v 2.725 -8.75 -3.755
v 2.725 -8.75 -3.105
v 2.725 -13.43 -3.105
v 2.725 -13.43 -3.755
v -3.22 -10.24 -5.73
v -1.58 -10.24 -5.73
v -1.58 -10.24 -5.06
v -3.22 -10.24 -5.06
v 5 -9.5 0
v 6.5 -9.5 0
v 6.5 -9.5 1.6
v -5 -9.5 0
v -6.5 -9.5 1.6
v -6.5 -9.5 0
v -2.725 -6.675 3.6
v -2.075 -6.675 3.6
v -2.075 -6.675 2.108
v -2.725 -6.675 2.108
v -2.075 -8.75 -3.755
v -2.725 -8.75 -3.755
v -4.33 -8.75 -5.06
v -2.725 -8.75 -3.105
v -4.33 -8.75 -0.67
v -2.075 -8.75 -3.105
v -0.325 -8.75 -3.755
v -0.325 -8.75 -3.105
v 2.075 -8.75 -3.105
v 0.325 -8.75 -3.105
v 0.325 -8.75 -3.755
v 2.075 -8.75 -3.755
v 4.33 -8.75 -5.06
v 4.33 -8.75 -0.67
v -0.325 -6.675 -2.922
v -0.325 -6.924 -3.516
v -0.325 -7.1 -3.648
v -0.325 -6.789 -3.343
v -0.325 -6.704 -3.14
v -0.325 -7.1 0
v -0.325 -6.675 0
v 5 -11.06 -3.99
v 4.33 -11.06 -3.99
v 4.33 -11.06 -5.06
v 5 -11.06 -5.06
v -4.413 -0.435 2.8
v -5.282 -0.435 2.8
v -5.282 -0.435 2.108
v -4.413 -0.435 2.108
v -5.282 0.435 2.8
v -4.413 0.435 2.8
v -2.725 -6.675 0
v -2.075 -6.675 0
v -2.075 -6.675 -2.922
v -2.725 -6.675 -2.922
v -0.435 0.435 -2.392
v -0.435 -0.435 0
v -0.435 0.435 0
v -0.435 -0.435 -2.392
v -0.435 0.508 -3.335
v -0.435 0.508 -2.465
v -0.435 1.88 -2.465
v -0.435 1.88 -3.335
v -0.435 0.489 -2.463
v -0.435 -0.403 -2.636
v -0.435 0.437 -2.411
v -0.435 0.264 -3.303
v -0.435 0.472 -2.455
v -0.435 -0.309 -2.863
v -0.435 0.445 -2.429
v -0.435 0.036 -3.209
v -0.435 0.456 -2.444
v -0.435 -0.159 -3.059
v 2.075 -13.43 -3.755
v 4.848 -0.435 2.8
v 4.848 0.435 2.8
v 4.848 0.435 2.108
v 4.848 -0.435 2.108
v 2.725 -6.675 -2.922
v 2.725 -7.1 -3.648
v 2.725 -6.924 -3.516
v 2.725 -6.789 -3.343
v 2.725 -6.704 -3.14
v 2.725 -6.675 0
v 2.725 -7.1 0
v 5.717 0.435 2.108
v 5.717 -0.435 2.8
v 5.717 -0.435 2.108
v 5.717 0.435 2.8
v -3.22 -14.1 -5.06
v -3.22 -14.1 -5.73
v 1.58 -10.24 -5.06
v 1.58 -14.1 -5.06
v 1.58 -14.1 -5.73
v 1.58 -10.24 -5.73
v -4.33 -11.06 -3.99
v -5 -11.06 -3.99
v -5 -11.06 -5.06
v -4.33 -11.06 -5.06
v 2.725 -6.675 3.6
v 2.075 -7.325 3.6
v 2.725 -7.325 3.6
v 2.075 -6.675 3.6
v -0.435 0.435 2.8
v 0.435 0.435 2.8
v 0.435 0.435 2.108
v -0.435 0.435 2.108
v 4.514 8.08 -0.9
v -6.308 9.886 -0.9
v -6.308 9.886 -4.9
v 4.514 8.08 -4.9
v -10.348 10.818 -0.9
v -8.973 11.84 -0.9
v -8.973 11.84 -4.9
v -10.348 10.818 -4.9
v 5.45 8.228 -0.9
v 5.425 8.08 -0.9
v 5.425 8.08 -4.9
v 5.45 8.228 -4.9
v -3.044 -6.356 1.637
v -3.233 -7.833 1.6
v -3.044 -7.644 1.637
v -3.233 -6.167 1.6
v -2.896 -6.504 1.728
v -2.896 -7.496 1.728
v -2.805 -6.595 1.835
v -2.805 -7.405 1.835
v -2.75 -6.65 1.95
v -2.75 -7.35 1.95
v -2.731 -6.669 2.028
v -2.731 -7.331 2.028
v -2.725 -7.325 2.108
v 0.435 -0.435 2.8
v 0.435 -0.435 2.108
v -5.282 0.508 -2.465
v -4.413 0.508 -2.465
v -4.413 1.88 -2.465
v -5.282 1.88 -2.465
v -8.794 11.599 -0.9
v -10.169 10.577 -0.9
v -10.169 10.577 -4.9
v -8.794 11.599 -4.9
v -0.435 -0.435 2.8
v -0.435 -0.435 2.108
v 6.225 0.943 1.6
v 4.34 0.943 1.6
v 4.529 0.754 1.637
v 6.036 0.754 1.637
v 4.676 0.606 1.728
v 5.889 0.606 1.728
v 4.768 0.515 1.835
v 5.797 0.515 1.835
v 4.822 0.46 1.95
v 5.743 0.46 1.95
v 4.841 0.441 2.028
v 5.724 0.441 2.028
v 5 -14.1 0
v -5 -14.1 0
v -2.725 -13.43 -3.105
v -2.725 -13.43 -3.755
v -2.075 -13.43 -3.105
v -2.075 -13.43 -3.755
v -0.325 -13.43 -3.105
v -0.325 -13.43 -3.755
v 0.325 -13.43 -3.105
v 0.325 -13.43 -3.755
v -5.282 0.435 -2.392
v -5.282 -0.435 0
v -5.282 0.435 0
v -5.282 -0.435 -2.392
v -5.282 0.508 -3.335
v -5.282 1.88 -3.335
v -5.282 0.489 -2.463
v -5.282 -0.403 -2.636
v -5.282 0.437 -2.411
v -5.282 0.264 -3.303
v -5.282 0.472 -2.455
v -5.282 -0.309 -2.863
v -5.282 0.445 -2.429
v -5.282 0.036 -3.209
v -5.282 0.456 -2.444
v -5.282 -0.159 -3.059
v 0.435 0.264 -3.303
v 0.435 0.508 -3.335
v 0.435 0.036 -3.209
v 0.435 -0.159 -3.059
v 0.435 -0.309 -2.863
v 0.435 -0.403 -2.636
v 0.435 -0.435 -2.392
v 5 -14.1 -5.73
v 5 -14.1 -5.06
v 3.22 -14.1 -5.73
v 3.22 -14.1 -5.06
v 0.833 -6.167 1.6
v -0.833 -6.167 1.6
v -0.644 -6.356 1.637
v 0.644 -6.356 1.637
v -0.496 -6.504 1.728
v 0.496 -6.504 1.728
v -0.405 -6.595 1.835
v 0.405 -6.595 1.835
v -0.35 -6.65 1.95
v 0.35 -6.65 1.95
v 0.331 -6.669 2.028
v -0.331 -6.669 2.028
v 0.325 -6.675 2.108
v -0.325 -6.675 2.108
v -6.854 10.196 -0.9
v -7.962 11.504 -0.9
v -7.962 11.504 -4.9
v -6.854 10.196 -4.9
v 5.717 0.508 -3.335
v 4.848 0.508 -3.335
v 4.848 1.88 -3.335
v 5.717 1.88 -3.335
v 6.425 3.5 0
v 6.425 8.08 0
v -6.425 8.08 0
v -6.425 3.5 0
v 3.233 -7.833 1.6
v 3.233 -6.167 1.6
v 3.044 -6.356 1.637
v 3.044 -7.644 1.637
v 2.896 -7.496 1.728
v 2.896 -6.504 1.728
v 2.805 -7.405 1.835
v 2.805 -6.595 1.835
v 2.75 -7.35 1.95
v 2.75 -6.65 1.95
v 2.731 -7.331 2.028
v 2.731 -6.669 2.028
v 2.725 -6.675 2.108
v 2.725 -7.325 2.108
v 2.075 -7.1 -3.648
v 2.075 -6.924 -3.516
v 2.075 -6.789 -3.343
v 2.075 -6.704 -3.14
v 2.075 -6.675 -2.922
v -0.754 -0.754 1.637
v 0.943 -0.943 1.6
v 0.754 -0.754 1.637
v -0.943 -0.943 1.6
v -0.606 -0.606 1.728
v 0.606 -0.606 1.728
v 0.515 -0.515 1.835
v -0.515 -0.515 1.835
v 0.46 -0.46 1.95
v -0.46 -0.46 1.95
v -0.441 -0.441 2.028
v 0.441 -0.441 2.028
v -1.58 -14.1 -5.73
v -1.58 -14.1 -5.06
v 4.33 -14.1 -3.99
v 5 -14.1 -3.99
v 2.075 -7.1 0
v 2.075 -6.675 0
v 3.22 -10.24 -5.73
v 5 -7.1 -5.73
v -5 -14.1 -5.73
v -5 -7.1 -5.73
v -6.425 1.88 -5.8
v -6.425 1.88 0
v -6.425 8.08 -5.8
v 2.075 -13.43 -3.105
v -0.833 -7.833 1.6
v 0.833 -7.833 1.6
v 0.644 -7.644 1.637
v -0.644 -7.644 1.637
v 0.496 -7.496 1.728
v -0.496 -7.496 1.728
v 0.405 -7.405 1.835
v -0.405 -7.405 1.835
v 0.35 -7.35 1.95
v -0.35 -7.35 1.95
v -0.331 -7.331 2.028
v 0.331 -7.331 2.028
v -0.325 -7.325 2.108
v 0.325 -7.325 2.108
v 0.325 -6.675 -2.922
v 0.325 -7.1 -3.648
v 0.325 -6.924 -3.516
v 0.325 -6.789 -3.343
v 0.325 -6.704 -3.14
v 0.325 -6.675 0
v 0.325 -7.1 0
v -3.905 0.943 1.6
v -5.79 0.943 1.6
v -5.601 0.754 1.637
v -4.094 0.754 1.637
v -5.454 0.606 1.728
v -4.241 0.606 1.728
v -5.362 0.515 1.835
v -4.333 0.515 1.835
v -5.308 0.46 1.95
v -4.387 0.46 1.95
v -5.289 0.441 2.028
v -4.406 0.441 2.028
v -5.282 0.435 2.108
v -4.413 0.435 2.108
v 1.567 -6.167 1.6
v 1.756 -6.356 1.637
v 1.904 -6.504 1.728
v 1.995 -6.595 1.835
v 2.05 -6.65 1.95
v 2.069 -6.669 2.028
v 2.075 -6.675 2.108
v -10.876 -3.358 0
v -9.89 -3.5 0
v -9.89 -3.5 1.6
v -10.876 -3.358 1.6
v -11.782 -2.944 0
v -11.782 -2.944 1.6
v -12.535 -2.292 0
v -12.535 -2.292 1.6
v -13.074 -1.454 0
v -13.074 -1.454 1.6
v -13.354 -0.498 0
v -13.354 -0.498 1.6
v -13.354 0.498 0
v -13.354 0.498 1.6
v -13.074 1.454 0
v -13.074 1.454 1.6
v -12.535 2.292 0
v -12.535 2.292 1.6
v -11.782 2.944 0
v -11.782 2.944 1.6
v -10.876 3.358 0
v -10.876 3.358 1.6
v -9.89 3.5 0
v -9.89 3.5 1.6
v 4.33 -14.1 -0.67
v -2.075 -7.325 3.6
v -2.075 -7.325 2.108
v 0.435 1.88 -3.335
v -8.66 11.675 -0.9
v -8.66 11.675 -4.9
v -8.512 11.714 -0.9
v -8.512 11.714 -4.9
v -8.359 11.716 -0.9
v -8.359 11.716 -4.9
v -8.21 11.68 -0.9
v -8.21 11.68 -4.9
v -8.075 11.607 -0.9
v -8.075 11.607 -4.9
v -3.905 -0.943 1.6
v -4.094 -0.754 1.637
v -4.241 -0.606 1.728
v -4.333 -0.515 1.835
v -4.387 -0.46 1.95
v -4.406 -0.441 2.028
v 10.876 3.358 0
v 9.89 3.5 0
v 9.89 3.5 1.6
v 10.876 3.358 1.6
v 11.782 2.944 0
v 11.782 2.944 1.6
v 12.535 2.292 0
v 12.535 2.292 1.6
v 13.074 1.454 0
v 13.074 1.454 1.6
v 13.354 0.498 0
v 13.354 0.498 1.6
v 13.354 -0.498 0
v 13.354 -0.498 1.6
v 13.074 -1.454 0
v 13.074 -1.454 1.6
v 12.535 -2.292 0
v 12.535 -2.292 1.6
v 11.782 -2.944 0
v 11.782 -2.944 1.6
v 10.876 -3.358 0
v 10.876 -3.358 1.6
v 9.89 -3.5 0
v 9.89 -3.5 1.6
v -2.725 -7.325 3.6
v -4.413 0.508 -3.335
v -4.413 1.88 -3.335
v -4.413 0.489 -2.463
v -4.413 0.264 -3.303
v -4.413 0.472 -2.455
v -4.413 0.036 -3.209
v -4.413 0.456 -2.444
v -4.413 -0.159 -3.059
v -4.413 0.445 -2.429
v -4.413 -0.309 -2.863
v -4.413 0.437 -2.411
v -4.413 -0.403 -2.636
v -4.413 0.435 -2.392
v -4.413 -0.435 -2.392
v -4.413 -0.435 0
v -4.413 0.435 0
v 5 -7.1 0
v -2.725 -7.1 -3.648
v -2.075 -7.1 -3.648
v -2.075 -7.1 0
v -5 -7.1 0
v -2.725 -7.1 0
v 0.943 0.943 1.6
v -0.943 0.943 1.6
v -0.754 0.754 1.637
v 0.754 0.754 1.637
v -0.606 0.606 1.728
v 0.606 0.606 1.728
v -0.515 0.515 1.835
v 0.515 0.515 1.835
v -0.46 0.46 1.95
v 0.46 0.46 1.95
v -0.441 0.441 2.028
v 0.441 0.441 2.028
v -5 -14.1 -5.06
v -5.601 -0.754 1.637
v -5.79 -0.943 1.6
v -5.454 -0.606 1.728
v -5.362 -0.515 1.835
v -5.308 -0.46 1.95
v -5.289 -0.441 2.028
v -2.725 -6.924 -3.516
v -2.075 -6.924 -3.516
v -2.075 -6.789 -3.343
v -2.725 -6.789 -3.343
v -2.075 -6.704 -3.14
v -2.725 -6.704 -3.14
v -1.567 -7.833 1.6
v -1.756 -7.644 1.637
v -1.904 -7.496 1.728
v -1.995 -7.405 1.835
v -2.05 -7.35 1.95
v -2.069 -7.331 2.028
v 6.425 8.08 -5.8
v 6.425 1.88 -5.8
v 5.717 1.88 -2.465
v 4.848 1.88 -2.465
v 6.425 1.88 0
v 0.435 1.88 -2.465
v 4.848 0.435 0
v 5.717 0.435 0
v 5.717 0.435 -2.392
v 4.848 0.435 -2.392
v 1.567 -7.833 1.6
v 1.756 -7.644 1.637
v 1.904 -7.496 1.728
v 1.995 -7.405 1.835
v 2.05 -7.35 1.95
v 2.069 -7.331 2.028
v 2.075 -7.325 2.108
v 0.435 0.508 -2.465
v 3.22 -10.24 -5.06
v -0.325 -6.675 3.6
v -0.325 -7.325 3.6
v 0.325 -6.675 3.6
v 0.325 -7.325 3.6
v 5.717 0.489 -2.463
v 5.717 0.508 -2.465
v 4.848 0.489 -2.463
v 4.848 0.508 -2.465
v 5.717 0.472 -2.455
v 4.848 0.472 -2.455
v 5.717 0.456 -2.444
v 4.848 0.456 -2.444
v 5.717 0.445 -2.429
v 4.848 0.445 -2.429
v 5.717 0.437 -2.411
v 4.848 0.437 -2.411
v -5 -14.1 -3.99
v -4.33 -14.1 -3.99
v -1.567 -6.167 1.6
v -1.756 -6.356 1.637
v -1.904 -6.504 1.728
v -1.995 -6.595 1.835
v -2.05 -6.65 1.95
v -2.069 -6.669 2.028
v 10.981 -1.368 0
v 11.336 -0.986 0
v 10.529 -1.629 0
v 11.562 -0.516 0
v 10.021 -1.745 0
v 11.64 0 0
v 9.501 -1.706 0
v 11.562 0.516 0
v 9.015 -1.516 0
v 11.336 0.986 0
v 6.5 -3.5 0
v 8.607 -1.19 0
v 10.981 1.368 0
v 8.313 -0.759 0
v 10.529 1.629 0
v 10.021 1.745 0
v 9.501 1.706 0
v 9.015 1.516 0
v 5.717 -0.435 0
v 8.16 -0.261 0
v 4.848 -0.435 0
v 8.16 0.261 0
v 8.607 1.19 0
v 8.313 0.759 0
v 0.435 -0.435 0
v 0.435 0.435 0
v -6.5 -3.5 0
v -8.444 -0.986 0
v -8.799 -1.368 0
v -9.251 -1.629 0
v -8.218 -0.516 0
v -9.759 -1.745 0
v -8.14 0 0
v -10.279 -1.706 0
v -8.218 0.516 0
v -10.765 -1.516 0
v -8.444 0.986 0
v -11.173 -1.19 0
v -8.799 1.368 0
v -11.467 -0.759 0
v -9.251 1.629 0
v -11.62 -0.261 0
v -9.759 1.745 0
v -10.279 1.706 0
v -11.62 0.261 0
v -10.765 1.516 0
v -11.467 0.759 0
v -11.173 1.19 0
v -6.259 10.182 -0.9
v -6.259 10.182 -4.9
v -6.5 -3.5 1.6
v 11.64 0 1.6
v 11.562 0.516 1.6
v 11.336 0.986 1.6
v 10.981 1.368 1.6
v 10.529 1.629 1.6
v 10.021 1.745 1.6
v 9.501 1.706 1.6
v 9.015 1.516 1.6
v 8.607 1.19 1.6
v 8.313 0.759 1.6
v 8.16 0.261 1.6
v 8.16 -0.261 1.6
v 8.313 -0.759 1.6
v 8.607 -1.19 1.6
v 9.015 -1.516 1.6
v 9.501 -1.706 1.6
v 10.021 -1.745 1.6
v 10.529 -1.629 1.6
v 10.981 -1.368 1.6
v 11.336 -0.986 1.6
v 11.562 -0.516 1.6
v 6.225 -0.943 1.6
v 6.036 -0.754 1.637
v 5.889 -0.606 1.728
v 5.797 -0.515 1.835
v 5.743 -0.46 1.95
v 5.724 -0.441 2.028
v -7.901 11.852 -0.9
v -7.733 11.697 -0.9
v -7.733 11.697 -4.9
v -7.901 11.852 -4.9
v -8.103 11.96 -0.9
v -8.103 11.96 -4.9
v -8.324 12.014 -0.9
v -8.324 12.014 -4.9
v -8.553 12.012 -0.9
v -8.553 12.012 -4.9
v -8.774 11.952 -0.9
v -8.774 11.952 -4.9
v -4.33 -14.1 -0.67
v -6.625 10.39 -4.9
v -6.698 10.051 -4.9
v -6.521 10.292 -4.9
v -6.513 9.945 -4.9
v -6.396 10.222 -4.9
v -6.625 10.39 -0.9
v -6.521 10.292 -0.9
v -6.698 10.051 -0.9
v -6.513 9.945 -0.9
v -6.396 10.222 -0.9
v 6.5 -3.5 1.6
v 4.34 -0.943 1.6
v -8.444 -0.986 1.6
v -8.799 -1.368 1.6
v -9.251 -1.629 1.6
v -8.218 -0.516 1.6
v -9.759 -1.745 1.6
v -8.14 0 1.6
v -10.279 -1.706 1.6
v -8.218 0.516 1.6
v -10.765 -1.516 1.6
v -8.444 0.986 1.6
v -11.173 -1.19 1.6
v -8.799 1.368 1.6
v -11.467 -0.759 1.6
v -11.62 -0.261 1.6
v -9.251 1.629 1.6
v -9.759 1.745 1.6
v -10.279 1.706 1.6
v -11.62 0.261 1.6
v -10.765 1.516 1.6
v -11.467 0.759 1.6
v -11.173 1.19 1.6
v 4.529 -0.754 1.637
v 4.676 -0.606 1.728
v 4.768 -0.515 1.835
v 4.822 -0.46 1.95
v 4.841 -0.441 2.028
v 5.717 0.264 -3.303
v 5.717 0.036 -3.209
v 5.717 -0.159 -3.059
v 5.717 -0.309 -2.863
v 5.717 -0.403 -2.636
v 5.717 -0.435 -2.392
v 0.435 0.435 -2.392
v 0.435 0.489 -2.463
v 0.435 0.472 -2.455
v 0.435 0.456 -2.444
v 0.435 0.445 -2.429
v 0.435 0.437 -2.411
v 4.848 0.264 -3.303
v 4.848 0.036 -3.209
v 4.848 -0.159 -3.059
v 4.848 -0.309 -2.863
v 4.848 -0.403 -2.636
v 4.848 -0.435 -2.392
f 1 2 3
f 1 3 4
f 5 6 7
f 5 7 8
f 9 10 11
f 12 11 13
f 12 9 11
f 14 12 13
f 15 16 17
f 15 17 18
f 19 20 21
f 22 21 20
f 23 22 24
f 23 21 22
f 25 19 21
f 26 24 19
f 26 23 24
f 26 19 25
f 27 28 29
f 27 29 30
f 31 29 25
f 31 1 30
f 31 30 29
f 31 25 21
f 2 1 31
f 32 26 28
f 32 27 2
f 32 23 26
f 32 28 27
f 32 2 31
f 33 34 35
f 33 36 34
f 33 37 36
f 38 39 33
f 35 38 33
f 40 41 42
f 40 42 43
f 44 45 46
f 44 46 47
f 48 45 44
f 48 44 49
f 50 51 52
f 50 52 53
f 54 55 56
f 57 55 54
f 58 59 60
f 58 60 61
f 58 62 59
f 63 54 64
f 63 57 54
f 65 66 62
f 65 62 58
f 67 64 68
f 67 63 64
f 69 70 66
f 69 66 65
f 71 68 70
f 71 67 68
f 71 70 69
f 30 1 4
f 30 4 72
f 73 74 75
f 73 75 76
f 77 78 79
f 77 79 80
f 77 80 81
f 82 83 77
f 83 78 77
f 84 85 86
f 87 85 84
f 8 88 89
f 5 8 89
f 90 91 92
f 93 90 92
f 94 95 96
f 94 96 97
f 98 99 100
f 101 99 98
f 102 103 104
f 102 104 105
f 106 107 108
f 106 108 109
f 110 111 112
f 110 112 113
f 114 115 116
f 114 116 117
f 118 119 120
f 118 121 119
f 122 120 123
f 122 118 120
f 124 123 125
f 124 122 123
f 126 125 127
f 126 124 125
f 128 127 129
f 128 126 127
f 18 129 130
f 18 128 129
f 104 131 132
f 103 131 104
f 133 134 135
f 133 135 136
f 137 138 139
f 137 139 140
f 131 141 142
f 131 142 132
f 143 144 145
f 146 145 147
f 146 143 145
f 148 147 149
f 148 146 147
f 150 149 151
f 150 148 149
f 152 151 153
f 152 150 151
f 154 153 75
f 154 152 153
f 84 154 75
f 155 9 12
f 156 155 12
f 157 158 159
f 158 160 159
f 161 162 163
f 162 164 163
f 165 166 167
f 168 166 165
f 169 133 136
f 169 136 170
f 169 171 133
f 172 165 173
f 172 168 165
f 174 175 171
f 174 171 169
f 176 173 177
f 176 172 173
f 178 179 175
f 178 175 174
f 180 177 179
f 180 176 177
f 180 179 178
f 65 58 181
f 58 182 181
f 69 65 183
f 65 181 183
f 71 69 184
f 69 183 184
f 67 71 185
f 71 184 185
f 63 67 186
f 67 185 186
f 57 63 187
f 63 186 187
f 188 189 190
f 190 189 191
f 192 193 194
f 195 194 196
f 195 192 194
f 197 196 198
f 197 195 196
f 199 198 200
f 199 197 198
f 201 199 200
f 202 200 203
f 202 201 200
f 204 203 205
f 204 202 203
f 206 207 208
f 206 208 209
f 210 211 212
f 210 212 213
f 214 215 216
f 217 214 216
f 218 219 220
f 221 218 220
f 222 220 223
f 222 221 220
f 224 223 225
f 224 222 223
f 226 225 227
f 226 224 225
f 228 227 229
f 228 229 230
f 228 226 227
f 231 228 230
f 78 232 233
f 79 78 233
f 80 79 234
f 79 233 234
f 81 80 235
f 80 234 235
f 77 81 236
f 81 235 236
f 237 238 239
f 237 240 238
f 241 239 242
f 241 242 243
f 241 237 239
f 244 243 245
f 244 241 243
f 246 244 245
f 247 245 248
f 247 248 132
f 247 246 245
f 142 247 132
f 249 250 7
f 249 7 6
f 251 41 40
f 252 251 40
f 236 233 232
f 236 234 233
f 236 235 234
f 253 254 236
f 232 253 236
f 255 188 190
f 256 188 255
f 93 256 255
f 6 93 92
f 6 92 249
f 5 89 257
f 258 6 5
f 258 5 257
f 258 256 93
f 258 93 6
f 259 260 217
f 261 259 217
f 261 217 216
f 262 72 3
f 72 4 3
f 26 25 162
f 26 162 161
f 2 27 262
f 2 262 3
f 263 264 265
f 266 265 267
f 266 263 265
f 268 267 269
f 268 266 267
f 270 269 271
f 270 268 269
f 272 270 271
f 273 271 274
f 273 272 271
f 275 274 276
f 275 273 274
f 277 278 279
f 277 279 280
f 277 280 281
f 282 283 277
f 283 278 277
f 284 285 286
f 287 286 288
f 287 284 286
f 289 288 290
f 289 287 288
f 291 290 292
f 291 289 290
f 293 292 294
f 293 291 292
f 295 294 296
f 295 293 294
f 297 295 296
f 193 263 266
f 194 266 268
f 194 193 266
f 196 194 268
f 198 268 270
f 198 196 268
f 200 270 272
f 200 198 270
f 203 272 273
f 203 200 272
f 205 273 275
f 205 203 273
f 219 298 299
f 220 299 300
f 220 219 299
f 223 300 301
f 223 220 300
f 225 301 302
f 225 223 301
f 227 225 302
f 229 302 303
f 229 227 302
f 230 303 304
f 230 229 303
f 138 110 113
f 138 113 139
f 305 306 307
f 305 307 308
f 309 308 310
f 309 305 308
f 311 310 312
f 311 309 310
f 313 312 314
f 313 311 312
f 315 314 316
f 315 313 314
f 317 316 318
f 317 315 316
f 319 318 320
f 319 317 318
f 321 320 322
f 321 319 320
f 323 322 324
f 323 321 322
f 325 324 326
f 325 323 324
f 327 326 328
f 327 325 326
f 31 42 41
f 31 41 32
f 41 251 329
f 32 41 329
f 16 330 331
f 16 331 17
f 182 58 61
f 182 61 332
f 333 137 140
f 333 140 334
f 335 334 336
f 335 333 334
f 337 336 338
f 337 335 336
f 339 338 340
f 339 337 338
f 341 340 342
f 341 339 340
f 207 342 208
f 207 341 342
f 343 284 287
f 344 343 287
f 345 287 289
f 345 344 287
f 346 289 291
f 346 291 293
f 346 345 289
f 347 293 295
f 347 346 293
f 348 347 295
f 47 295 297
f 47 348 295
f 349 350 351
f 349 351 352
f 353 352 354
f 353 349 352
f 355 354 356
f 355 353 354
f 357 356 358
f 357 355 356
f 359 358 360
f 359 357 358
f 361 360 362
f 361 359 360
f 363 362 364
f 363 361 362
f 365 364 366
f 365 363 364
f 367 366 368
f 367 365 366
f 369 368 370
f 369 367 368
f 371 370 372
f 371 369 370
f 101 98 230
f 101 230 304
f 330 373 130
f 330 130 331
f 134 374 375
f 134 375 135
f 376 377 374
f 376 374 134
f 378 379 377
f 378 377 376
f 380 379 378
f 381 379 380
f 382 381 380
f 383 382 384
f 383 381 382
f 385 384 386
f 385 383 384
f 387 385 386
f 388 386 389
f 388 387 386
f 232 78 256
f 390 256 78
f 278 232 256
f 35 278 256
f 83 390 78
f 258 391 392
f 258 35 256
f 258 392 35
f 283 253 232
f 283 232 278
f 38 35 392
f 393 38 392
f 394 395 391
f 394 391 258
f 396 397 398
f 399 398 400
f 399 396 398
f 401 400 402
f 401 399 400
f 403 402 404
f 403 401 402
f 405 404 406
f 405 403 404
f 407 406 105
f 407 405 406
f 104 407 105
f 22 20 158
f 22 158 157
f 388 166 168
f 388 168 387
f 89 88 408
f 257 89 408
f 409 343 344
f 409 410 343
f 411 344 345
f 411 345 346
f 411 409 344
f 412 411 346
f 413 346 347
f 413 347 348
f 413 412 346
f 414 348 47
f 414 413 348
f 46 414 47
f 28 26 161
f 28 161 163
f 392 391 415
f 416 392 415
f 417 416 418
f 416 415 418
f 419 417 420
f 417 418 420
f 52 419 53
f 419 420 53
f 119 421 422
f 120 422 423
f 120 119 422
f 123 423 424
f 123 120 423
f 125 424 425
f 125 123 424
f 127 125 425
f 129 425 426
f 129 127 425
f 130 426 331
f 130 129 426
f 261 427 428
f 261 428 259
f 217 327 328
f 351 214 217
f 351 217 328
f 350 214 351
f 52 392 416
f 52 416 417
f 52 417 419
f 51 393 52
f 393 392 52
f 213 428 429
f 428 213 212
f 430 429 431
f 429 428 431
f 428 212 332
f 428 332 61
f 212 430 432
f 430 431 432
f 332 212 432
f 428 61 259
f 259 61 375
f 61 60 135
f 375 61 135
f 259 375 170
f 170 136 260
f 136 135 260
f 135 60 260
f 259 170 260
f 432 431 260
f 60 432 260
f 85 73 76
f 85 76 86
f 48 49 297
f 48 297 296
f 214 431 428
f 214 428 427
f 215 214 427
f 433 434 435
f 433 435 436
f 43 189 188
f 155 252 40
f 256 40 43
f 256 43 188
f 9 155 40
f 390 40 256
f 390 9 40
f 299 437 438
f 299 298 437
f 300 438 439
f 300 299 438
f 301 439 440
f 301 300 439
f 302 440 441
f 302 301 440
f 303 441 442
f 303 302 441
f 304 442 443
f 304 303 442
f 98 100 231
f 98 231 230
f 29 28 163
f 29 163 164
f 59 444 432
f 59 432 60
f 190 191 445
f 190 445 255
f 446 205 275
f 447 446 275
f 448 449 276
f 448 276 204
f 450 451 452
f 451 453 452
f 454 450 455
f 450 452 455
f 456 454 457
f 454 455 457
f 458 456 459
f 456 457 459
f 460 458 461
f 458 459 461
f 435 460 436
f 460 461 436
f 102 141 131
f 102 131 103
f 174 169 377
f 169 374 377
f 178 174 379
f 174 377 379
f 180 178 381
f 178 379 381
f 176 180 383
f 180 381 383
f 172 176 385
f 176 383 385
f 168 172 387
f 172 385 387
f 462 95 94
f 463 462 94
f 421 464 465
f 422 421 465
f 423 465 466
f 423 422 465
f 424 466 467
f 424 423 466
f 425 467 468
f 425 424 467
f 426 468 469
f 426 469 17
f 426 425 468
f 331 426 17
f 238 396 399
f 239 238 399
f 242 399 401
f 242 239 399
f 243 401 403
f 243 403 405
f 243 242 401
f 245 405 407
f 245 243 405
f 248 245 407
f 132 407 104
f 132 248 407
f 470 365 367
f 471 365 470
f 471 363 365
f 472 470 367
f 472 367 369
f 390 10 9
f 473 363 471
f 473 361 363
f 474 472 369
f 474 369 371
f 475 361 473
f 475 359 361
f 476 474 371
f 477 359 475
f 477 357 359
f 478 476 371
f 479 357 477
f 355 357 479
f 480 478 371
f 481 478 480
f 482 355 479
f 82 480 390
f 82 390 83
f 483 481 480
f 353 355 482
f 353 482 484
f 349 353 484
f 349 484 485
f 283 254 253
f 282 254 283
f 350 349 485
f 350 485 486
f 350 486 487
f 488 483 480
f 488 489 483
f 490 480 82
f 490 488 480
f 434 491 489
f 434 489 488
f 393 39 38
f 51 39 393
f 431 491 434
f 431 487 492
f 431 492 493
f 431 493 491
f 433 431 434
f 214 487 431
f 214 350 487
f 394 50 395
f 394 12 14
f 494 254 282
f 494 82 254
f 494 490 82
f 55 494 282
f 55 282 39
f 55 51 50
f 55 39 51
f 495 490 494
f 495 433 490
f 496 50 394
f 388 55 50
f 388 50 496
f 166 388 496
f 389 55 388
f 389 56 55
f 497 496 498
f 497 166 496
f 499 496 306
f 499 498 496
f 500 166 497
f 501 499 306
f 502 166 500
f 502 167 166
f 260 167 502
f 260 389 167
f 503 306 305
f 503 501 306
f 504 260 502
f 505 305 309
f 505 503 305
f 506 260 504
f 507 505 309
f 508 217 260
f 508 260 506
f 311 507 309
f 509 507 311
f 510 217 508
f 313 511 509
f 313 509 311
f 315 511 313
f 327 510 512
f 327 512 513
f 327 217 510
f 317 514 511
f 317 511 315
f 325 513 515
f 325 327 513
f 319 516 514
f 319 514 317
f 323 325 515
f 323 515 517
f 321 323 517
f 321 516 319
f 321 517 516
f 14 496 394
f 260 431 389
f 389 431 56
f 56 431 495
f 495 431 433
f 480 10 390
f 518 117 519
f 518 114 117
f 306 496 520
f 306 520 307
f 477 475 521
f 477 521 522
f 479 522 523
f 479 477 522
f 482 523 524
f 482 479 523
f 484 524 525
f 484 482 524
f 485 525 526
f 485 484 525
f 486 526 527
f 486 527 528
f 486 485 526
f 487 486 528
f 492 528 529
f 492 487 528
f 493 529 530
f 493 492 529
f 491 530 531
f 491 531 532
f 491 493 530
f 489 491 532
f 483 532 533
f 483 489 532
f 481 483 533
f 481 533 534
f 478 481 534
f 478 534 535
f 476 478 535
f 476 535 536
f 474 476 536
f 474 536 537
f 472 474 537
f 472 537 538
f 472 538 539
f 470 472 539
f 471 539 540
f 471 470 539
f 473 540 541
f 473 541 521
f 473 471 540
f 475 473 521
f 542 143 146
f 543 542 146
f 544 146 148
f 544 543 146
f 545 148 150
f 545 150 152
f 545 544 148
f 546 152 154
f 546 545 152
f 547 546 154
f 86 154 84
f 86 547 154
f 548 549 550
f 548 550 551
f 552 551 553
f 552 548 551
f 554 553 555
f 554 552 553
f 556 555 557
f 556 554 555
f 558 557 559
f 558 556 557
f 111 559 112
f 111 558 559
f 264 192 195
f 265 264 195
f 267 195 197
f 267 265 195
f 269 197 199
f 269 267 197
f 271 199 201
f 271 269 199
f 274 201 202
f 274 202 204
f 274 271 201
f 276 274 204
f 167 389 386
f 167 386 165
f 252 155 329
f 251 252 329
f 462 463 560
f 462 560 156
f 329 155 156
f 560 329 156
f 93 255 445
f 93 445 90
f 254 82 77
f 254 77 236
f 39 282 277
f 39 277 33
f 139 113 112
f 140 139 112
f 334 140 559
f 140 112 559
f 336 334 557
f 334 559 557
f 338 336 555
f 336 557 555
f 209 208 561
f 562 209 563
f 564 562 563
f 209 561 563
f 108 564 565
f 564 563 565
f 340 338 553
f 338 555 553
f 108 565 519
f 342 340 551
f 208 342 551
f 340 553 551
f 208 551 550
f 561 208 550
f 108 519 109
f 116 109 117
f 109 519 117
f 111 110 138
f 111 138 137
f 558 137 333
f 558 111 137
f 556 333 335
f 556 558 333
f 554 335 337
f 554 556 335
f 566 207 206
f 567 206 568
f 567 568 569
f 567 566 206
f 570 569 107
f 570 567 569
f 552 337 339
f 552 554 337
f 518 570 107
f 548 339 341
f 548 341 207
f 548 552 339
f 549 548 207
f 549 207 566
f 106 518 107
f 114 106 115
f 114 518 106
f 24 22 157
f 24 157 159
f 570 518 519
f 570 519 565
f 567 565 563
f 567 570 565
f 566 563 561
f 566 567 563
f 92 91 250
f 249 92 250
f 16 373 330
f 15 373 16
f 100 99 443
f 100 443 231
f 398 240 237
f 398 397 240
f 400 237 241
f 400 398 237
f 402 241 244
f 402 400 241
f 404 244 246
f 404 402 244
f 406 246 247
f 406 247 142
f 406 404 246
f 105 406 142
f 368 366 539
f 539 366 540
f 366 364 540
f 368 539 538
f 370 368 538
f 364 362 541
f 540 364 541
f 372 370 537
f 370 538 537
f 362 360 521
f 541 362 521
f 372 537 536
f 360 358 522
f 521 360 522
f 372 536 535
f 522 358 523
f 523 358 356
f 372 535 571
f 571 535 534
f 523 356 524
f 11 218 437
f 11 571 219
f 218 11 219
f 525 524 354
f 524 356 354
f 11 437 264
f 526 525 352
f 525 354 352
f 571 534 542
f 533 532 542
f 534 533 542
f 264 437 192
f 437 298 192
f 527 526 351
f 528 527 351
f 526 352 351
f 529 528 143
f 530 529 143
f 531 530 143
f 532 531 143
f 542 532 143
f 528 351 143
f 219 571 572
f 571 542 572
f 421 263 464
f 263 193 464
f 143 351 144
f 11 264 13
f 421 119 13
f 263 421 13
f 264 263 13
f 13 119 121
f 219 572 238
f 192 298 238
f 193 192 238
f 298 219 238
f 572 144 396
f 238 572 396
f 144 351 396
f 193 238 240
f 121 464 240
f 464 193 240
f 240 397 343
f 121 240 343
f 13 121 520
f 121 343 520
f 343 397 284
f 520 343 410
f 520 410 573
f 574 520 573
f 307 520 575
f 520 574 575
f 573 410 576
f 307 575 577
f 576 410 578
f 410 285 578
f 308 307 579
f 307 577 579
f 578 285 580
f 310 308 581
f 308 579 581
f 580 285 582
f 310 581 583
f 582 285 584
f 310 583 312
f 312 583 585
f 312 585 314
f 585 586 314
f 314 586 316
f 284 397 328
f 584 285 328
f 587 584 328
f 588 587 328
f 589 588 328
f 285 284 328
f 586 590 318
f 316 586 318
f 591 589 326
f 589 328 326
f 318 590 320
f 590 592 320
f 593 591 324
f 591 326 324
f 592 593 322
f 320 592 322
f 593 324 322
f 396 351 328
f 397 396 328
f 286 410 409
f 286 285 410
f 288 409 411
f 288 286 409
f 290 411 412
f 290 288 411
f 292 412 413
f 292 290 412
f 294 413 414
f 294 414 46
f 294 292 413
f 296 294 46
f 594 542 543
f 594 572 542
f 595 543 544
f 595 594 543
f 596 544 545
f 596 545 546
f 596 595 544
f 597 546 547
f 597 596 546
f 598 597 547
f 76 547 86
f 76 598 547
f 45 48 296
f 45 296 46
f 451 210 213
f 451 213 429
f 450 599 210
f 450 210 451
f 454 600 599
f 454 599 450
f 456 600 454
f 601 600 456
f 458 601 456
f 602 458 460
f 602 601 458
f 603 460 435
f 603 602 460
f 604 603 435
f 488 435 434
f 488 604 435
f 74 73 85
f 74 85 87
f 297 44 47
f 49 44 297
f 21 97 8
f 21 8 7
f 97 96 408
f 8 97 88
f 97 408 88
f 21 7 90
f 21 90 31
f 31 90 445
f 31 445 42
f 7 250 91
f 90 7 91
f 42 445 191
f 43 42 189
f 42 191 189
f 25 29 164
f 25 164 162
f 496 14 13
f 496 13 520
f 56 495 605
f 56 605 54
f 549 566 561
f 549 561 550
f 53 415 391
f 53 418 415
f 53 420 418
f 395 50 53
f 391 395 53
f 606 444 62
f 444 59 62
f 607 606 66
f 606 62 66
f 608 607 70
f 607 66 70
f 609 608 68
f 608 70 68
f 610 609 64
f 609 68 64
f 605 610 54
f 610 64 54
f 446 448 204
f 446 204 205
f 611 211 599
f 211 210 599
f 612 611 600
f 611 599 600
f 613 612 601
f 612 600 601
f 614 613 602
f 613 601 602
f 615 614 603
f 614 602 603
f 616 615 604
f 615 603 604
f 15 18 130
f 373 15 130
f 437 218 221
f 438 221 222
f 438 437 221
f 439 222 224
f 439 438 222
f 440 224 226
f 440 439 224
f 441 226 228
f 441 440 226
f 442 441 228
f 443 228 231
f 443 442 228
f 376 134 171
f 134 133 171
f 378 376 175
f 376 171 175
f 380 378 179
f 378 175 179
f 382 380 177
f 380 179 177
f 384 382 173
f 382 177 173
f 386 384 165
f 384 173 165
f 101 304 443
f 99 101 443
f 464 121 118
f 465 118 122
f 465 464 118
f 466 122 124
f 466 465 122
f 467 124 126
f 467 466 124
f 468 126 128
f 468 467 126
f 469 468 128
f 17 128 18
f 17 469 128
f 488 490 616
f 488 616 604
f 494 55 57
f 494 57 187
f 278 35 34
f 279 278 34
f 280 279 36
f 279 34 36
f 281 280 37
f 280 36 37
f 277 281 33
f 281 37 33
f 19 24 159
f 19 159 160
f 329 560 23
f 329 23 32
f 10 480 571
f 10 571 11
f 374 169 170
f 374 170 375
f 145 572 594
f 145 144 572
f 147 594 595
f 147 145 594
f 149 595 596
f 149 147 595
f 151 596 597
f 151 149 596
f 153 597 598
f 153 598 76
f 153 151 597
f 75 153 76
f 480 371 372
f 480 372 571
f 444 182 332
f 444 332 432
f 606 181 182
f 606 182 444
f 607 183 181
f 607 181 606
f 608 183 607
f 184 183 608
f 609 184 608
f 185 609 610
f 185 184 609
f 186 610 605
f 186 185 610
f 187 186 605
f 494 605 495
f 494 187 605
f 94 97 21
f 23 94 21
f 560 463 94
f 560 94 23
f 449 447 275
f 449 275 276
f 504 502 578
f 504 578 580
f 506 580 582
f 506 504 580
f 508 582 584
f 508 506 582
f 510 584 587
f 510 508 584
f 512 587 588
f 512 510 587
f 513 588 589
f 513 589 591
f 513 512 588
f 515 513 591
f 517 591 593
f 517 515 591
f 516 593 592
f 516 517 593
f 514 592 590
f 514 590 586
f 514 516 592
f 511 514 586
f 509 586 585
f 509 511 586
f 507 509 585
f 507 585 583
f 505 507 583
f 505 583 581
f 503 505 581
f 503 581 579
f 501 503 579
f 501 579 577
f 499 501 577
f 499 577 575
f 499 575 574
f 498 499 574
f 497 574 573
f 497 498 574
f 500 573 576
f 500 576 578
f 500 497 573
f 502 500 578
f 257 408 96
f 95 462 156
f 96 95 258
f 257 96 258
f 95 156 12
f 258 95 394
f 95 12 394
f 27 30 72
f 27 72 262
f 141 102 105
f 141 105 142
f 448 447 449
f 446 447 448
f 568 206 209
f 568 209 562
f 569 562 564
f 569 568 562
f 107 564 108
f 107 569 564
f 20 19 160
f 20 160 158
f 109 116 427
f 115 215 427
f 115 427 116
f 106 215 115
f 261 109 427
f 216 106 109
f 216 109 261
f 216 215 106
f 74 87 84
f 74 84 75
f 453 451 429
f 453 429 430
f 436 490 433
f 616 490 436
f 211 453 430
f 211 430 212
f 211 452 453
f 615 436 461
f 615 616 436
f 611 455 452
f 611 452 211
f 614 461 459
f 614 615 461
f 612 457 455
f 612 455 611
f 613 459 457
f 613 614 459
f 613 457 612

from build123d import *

# Parameters (mm, degrees)
SKETCH1_R           = 1.75
BOSS_EXTRUDE1_DEPTH = 1.6
SKETCH2_W           = 12.85
SKETCH2_H           = 6.2
BOSS_EXTRUDE2_DEPTH = 5.8
BOSS_EXTRUDE3_DEPTH = 2
SKETCH4_W           = 0.87
SKETCH4_H           = 0.87
SKETCH6_W           = 10
SKETCH6_H           = 7
BOSS_EXTRUDE4_DEPTH = 5.73
SKETCH7_W           = 8.66
SKETCH7_H           = 4.39
CUT_EXTRUDE1_DEPTH  = 5.35
SKETCH8_W           = 1.64
SKETCH8_H           = 0.67
CUT_EXTRUDE2_DEPTH  = 3.86
SKETCH9_W           = 0.67
SKETCH9_H           = 1.07
CUT_EXTRUDE3_DEPTH  = 3.04
SKETCH11_W          = 0.65
SKETCH11_H          = 0.65
FILLET1_R           = 0.508


with BuildPart() as part:
    # Sketch1 → Boss-Extrude1 (new body)
    with BuildSketch(Plane.XY):
        with BuildLine():
            Line((-9.890000015, 3.499999985), (9.890000015, 3.499999985))
            ThreePointArc((9.890000015, 3.499999985), (13.39, 0), (9.890000015, -3.499999985))
            Line((9.890000015, -3.499999985), (6.5, -3.499999985))
            Line((6.5, -3.499999985), (6.5, -9.500000015))
            Line((6.5, -9.500000015), (-6.5, -9.500000015))
            Line((-6.5, -9.500000015), (-6.5, -3.499999985))
            Line((-6.5, -3.499999985), (-9.890000015, -3.499999985))
            ThreePointArc((-9.890000015, -3.499999985), (-13.39, 0), (-9.890000015, 3.499999985))
        make_face()
        with Locations((-9.890000015, 0)):
            Circle(SKETCH1_R, mode=Mode.SUBTRACT)
        with Locations((9.890000015, 0)):
            Circle(SKETCH1_R, mode=Mode.SUBTRACT)
    extrude(amount=BOSS_EXTRUDE1_DEPTH)

    # Sketch2 → Boss-Extrude2 (add)
    with BuildSketch(Plane(origin=(0, 0, 0), x_dir=(-1, 0, 0), z_dir=(0, 0, -1))):
        with Locations((0, 4.979999985)):
            Rectangle(SKETCH2_W, SKETCH2_H)
    extrude(amount=BOSS_EXTRUDE2_DEPTH)

    # Sketch3 → Boss-Extrude3 (add, symmetric)
    with BuildSketch(Plane.XY.offset(-2.9)):
        with BuildLine():
            Line((5.449691358, 8.227953818), (-6.259057602, 10.18197492))
            ThreePointArc((-6.259057602, 10.18197492), (-6.460661712, 10.25352545), (-6.625323786, 10.390090807))
            Line((-6.625323786, 10.390090807), (-7.732620651, 11.697470228))
            ThreePointArc((-7.732620651, 11.697470228), (-8.324478366, 12.014086654), (-8.972711282, 11.839915469))
            Line((-8.972711282, 11.839915469), (-10.347606141, 10.817657467))
            Line((-10.347606141, 10.817657467), (-10.168606555, 10.576910404))
            Line((-10.168606555, 10.576910404), (-8.793711695, 11.599168407))
            ThreePointArc((-8.793711695, 11.599168407), (-8.358713291, 11.716046438), (-7.961545614, 11.503580153))
            Line((-7.961545614, 11.503580153), (-6.854248749, 10.196200732))
            ThreePointArc((-6.854248749, 10.196200732), (-6.608869972, 9.992691572), (-6.308440318, 9.886067253))
            Line((-6.308440318, 9.886067253), (5.400308642, 7.932046152))
            Line((5.400308642, 7.932046152), (5.449691358, 8.227953818))
        make_face()
    extrude(amount=BOSS_EXTRUDE3_DEPTH, both=True)

    # Sweep3: sweep along a path in Sketch5
    with BuildLine(Plane(origin=(0, 0, 0), x_dir=(0, 0, -1), z_dir=(1, 0, 0))) as sweep3_path:
        Line((2.9, 1.879999985), (2.9, 0.508))
        ThreePointArc((2.9, 0.508), (2.751210245, 0.148789755), (2.392, 0))
        Line((2.392, 0), (-2.8, 0))
    # Sketch4 → Sweep3 (sweep)
    with BuildSketch(Plane.XZ.offset(-1.879999985)):
        with Locations((-4.8475, -2.9)):
            Rectangle(SKETCH4_W, SKETCH4_H)
        with Locations((0, -2.9)):
            Rectangle(SKETCH4_W, SKETCH4_H)
        with Locations((5.2825, -2.9)):
            Rectangle(SKETCH4_W, SKETCH4_H)
    sweep(path=sweep3_path.line)

    # Sketch6 → Boss-Extrude4 (add)
    with BuildSketch(Plane(origin=(0, 0, 0), x_dir=(-1, 0, 0), z_dir=(0, 0, -1))):
        with Locations((0, -10.600000015)):
            Rectangle(SKETCH6_W, SKETCH6_H)
    extrude(amount=BOSS_EXTRUDE4_DEPTH)

    # Sketch7 → Cut-Extrude1 (cut)
    with BuildSketch(Plane.XZ.offset(14.100000015)):
        with Locations((0, -2.865)):
            Rectangle(SKETCH7_W, SKETCH7_H)
    extrude(amount=-CUT_EXTRUDE1_DEPTH, mode=Mode.SUBTRACT)

    # Sketch8 → Cut-Extrude2 (cut)
    with BuildSketch(Plane(origin=(0, -14.100000015, 0), x_dir=(-1, 0, 0), z_dir=(0, -1, 0))):
        with Locations((2.4, 5.395)):
            Rectangle(SKETCH8_W, SKETCH8_H)
        with Locations((-2.4, 5.395)):
            Rectangle(SKETCH8_W, SKETCH8_H)
    extrude(amount=-CUT_EXTRUDE2_DEPTH, mode=Mode.SUBTRACT)

    # Sketch9 → Cut-Extrude3 (cut)
    with BuildSketch(Plane.XZ.offset(14.100000015)):
        with Locations((-4.665, -4.525)):
            Rectangle(SKETCH9_W, SKETCH9_H)
        with Locations((4.665, -4.525)):
            Rectangle(SKETCH9_W, SKETCH9_H)
    extrude(amount=-CUT_EXTRUDE3_DEPTH, mode=Mode.SUBTRACT)

    # Sweep4: sweep along a path in Sketch10
    with BuildLine(Plane(origin=(0, 0, 0), x_dir=(0, 0, -1), z_dir=(1, 0, 0))) as sweep4_path:
        Line((3.43, -13.430000015), (3.43, -7.508000015))
        ThreePointArc((3.43, -7.508000015), (3.281210245, -7.14878977), (2.922, -7.000000015))
        Line((2.922, -7.000000015), (-3.6, -7.000000015))
    # Sketch11 → Sweep4 (sweep)
    with BuildSketch(Plane(origin=(0, -13.430000015, 0), x_dir=(1, 0, 0), z_dir=(0, 1, 0))):
        with Locations((-2.4, 3.43)):
            Rectangle(SKETCH11_W, SKETCH11_H)
        with Locations((0, 3.43)):
            Rectangle(SKETCH11_W, SKETCH11_H)
        with Locations((2.4, 3.43)):
            Rectangle(SKETCH11_W, SKETCH11_H)
    sweep(path=sweep4_path.line)

    # Fillet1
    fillet1_edges = [part.edges().sort_by_distance(p)[0] for p in [
        (0, 0.435, 1.6),
        (0.435, 0, 1.6),
        (0, -0.435, 1.6),
        (-0.435, 0, 1.6),
        (5.2825, 0.435, 1.6),
        (5.7175, 0, 1.6),
        (5.2825, -0.435, 1.6),
        (4.8475, 0, 1.6),
        (-2.4, -6.675000015, 1.6),
        (-2.4, -7.325000015, 1.6),
        (-2.725, -7.000000015, 1.6),
        (-2.075, -7.000000015, 1.6),
        (0, -6.675000015, 1.6),
        (0, -7.325000015, 1.6),
        (-0.325, -7.000000015, 1.6),
        (0.325, -7.000000015, 1.6),
        (2.4, -6.675000015, 1.6),
        (2.4, -7.325000015, 1.6),
        (2.075, -7.000000015, 1.6),
        (2.725, -7.000000015, 1.6),
        (-4.8475, 0.435, 1.6),
        (-4.4125, 0, 1.6),
        (-4.8475, -0.435, 1.6),
        (-5.2825, 0, 1.6),
    ]]
    fillet(fillet1_edges, radius=FILLET1_R)


solid = part.part
